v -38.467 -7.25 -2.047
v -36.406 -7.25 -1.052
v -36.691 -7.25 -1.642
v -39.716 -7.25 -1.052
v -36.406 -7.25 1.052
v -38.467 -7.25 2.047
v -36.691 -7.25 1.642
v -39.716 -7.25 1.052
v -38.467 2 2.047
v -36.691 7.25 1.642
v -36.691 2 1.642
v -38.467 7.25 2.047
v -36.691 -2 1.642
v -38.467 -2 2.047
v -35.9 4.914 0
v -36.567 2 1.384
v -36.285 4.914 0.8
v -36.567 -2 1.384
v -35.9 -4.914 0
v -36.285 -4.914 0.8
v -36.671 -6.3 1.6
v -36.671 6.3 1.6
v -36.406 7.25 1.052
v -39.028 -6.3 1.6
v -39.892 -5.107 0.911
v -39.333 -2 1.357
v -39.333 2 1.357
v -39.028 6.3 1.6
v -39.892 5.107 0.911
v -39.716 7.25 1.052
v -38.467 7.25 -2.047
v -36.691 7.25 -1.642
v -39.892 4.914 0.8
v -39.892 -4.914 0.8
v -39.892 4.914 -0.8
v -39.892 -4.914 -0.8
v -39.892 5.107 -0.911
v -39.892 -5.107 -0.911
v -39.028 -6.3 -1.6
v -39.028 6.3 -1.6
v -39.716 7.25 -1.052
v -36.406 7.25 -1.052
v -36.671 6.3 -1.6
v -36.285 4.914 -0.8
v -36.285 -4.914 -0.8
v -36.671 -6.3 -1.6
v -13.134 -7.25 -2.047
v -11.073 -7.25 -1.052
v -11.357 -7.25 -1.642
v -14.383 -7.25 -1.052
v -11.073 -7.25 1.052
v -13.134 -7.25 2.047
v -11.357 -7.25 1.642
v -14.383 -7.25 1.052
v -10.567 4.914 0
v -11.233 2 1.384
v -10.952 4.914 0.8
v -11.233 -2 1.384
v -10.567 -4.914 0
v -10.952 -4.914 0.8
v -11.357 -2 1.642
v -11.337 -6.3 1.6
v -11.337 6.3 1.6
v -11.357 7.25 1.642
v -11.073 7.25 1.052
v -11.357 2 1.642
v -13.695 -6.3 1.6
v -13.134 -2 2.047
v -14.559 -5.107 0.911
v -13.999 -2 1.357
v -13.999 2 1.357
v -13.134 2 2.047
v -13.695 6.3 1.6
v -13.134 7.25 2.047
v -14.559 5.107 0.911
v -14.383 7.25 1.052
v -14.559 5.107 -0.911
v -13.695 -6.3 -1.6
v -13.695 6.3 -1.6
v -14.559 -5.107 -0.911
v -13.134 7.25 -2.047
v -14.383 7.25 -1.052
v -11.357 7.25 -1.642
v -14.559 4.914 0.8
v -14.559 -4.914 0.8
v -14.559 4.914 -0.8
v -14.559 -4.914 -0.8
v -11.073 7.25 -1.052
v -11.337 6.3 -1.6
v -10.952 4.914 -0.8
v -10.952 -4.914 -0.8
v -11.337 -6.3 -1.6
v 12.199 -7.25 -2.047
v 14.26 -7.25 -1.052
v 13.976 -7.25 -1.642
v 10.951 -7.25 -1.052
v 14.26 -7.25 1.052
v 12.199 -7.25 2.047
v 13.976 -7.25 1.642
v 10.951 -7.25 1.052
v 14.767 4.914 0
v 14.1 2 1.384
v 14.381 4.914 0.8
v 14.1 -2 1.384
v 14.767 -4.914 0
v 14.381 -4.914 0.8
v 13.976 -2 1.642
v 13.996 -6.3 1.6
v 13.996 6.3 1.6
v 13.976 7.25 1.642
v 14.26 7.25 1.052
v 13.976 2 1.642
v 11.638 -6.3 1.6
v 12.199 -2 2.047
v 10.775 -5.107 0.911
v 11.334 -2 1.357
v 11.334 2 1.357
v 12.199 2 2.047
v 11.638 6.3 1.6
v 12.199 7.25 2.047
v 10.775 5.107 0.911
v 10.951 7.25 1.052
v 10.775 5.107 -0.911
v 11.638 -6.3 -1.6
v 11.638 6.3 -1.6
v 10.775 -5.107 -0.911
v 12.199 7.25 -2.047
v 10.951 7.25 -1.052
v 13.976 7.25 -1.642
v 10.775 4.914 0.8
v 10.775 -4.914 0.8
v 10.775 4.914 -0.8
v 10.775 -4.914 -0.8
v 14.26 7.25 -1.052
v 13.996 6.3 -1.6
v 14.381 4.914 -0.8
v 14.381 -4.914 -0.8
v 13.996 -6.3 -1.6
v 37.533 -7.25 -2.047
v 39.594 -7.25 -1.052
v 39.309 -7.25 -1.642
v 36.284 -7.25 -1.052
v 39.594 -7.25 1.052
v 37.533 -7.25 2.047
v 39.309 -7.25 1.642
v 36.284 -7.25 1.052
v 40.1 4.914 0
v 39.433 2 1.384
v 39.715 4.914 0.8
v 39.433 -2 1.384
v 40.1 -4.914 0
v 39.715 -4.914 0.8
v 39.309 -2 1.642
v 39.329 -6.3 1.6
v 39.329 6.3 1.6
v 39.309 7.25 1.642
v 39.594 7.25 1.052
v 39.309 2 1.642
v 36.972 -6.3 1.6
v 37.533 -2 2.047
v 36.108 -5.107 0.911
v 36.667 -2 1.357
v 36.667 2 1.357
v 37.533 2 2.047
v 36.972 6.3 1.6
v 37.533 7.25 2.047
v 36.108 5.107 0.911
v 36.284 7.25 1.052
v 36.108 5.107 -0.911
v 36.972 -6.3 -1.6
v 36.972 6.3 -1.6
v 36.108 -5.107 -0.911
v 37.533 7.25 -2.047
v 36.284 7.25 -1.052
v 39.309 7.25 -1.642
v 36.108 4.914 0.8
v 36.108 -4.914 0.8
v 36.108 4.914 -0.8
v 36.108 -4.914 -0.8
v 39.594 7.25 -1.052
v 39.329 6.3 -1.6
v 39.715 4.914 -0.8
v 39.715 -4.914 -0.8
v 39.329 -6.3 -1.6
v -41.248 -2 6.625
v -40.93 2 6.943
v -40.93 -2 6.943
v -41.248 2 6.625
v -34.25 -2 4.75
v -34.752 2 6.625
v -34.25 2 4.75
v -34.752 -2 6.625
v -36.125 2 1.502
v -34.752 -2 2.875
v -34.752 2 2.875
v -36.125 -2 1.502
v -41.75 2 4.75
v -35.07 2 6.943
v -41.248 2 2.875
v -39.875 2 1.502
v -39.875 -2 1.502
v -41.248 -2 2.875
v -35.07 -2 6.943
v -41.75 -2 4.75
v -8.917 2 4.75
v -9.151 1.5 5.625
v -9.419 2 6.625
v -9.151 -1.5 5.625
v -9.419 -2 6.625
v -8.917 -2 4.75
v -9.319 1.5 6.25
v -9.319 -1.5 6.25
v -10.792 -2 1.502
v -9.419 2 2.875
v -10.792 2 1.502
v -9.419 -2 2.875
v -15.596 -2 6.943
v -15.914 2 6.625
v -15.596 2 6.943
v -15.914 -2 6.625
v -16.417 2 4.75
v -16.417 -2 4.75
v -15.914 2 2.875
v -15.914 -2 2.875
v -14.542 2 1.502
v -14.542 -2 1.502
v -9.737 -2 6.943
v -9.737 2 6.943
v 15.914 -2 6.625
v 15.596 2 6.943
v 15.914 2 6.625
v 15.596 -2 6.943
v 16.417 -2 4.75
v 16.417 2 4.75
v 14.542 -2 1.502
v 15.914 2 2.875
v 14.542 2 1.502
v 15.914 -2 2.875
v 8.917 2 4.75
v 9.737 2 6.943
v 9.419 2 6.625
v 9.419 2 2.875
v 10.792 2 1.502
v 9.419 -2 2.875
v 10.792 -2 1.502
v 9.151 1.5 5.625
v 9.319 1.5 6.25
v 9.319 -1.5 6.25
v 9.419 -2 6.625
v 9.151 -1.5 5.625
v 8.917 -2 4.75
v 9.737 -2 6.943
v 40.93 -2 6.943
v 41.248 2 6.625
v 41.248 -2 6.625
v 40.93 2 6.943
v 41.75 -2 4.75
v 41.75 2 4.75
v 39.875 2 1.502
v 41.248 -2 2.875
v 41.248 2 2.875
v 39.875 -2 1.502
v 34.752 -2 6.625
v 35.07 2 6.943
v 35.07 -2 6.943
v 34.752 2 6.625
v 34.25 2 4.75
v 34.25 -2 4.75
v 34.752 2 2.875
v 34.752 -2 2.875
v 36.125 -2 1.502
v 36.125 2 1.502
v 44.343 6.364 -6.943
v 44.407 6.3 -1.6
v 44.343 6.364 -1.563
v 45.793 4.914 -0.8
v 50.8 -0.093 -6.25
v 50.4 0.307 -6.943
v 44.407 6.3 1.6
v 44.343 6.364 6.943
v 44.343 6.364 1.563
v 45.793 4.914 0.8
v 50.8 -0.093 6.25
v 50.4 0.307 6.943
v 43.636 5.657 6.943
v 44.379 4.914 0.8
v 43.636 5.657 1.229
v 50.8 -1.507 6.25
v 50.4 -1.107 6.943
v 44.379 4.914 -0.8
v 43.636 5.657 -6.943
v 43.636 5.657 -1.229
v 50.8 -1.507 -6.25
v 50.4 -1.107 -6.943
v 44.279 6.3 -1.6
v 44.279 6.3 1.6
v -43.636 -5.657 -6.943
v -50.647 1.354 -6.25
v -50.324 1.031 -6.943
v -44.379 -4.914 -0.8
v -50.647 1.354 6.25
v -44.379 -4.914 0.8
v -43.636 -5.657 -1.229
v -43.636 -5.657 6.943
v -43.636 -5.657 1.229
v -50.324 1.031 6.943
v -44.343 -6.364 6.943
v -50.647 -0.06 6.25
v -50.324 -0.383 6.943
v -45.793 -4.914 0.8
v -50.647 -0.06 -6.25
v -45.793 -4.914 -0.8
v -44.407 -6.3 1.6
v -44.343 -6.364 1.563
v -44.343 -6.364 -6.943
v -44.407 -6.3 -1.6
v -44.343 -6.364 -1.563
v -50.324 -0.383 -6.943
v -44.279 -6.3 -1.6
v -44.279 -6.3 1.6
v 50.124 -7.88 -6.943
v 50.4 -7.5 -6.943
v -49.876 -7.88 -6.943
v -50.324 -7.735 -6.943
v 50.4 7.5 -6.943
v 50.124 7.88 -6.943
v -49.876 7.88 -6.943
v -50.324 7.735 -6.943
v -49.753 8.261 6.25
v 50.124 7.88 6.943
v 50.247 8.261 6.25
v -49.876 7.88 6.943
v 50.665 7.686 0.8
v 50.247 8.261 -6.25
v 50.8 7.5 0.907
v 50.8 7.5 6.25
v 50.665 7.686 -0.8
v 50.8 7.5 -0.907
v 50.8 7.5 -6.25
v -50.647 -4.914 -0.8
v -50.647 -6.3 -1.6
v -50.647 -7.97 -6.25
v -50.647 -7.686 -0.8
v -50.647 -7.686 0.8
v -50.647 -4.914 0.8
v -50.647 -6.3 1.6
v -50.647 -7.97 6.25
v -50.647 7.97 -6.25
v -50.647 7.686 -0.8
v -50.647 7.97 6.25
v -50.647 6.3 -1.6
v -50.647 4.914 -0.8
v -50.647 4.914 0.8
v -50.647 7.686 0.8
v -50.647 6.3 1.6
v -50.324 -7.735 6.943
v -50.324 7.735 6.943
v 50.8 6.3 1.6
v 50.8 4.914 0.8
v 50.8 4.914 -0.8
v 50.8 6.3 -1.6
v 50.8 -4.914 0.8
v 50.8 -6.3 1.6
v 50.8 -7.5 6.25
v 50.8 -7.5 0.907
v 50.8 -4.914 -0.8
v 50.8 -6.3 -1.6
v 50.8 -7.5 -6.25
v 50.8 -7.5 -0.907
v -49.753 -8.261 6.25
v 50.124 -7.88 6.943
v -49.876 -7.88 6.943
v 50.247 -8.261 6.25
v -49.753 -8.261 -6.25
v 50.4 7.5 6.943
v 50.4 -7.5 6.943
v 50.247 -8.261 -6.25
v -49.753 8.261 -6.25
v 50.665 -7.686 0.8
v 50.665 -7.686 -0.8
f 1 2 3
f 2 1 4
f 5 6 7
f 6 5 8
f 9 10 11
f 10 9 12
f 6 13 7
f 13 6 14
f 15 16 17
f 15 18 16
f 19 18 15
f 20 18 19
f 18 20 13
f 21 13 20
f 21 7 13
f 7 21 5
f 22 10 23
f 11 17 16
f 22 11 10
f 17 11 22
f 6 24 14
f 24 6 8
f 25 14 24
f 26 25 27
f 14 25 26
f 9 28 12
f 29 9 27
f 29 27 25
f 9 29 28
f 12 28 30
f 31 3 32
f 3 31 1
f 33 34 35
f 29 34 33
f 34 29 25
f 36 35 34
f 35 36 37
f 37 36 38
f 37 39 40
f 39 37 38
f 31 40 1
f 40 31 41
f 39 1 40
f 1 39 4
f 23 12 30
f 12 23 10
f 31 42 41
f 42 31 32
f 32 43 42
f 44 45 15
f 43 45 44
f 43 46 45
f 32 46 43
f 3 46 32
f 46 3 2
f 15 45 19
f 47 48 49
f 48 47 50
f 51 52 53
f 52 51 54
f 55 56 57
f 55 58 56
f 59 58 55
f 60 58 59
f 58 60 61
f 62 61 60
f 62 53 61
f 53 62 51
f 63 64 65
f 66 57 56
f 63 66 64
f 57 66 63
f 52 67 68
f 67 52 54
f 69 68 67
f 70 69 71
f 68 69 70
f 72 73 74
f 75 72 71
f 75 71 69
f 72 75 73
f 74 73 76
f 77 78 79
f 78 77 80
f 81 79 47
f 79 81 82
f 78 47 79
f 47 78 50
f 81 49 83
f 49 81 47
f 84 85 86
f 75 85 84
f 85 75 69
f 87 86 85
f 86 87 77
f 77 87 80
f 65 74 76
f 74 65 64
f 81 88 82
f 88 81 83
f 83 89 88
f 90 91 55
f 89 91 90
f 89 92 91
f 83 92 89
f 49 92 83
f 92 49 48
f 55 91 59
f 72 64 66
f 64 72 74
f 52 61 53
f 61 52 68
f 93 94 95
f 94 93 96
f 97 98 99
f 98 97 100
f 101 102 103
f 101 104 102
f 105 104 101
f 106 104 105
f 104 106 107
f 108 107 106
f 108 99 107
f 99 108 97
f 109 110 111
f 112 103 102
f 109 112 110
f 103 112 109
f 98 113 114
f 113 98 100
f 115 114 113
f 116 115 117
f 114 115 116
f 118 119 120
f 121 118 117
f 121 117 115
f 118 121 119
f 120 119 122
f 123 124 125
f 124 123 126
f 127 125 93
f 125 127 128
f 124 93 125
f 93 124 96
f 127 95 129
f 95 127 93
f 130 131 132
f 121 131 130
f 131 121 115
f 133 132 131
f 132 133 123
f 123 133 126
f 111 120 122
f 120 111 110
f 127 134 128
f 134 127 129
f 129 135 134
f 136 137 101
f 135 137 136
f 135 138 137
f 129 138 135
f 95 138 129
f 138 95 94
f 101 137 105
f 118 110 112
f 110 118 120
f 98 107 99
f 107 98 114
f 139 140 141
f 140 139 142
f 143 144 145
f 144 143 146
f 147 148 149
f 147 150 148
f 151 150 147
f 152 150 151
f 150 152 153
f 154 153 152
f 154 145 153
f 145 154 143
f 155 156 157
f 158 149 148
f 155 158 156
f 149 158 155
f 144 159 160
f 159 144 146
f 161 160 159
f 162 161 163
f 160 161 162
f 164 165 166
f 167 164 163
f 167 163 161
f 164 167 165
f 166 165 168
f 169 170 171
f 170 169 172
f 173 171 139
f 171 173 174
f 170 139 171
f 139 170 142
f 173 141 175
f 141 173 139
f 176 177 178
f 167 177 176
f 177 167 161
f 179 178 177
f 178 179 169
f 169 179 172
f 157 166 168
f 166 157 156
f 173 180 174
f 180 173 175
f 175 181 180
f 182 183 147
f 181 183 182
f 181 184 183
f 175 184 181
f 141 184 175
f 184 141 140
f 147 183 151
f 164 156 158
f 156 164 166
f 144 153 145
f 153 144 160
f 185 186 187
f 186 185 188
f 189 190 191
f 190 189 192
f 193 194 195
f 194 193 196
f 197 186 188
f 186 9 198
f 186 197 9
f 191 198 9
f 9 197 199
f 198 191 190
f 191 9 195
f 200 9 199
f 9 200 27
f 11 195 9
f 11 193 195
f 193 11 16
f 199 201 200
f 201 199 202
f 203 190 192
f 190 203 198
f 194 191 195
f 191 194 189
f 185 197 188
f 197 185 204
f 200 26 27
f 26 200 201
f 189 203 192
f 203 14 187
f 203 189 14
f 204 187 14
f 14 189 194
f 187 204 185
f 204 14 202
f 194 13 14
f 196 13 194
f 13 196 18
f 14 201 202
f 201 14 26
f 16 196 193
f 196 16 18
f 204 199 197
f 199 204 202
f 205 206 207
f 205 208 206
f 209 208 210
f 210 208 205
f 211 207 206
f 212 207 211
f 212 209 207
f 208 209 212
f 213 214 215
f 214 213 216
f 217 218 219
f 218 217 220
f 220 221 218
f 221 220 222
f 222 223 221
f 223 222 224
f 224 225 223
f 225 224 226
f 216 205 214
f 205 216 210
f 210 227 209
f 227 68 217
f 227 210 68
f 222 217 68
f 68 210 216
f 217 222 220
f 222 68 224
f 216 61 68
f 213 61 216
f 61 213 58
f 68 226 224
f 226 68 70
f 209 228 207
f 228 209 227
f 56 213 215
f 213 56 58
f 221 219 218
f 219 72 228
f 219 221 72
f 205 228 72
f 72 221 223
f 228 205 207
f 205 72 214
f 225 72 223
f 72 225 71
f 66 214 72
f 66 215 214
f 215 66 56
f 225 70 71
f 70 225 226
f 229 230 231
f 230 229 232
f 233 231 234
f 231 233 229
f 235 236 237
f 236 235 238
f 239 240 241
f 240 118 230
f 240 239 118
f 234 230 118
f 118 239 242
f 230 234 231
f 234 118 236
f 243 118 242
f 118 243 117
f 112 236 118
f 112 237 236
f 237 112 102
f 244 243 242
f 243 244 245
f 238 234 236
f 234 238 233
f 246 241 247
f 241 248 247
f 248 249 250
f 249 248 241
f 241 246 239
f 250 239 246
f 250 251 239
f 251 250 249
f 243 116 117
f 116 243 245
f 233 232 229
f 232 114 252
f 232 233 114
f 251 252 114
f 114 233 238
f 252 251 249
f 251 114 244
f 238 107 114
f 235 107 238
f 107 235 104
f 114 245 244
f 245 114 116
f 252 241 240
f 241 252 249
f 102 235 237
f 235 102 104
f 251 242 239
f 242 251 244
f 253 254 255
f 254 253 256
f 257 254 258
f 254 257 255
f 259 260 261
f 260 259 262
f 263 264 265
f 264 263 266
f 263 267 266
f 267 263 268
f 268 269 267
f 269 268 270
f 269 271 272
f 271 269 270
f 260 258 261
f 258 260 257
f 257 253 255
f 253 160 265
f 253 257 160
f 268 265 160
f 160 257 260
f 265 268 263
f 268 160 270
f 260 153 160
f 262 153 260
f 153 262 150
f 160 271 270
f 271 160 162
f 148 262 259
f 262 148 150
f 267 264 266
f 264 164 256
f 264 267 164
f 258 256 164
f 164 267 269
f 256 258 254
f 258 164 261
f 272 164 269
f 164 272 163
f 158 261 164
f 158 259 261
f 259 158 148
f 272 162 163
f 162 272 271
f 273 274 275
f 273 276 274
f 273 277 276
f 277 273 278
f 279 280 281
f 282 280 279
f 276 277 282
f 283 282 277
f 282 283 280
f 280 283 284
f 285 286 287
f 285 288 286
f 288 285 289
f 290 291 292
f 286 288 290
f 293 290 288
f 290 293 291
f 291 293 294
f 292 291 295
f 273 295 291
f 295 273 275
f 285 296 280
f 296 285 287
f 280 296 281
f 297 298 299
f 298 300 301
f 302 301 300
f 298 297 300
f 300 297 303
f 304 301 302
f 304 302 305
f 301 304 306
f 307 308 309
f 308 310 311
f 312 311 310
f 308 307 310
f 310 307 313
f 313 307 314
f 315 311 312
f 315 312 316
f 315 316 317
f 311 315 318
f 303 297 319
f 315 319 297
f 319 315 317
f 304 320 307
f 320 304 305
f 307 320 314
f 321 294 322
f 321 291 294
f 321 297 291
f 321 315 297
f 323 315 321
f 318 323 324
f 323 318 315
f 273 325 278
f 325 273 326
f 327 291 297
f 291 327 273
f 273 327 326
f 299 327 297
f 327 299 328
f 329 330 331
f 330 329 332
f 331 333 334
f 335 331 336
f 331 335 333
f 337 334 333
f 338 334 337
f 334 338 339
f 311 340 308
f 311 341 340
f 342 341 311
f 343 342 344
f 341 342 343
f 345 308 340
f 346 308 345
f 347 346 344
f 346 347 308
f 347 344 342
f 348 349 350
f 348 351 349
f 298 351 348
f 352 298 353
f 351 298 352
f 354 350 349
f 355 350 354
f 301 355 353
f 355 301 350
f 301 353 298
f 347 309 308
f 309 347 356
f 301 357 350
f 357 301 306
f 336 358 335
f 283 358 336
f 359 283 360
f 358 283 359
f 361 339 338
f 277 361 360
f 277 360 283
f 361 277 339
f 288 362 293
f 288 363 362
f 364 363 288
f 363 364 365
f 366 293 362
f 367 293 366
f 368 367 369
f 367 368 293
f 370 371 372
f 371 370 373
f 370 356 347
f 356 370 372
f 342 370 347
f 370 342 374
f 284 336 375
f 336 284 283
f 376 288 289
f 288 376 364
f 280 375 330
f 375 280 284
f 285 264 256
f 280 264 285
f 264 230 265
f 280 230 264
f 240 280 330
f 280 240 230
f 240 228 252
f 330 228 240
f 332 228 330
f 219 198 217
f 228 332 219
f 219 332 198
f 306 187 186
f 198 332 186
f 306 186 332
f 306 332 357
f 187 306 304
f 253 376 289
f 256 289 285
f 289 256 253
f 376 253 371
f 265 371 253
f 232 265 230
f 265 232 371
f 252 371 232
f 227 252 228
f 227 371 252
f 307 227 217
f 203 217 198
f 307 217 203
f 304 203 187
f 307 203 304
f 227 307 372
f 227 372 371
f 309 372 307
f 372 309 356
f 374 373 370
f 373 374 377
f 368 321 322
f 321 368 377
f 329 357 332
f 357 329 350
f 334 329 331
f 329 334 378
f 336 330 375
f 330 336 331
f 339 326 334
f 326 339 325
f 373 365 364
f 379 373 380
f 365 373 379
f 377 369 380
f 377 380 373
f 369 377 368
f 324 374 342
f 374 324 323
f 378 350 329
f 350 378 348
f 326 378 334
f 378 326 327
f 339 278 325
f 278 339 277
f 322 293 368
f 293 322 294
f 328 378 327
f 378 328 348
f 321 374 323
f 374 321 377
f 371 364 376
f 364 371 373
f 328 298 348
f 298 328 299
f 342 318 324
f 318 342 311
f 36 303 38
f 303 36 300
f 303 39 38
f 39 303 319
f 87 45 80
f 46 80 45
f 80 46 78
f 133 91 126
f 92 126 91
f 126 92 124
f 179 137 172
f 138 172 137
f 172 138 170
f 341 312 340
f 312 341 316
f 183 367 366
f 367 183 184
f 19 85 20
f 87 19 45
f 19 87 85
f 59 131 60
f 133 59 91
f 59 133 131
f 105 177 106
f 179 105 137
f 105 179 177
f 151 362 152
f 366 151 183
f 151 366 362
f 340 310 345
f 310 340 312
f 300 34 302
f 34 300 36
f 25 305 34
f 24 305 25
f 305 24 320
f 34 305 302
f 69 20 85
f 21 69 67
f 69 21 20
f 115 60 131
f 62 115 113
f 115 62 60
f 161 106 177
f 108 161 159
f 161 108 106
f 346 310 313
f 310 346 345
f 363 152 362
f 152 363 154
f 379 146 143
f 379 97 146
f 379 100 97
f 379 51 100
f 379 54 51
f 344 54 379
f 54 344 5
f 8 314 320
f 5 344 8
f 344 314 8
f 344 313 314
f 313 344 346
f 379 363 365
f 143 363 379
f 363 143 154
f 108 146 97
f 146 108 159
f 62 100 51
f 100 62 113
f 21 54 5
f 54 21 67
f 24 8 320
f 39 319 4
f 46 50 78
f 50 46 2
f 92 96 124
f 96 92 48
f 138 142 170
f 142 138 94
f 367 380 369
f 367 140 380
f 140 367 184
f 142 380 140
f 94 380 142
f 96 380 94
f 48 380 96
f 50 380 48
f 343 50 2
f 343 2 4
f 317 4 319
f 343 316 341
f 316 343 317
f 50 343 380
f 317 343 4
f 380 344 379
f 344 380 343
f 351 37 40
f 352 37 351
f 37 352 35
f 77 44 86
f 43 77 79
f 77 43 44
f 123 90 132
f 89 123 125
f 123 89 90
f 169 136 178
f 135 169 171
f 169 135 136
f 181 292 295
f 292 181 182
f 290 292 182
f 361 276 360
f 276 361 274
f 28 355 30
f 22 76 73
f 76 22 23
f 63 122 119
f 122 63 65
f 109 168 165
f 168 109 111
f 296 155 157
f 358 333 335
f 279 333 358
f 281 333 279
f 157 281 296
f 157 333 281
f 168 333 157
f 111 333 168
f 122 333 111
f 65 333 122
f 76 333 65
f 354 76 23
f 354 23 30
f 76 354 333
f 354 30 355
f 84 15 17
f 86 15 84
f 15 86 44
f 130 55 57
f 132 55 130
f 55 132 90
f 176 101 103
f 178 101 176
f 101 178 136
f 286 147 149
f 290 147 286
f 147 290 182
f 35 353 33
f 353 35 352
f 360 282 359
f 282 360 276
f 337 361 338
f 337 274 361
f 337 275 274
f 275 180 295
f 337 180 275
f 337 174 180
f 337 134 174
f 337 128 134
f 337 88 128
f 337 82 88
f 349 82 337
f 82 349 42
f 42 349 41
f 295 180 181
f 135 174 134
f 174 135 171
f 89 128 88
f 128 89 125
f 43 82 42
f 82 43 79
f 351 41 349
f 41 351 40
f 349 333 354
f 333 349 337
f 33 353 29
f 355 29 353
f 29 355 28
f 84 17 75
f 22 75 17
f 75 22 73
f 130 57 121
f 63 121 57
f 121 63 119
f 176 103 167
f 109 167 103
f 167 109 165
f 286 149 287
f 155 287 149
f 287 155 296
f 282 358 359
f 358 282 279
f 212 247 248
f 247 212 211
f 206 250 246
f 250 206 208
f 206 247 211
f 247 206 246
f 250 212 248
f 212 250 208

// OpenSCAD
// Parameters
rail_length = 100.0; //[50.0:200.0:1.0]
rail_width = 15.0; //[7.5:30.0:0.5]
rail_height = 12.5; //[6.25:25.0:0.5]
hole_count = 4; //[2:10:1]
end_margin = 12.0; //[6.0:24.0:0.5]
mount_hole_d = 4.2; //[2.0:8.0:0.1]
counterbore_d = 7.5; //[4.0:14.0:0.1]
counterbore_depth = 3.0; //[1.0:6.0:0.1]
end_chamfer = 1.0; //[0.5:3.0:0.1]
edge_fillet_r = 0.8; //[0.2:2.0:0.1]
raceway_groove_r = 1.6; //[0.8:3.0:0.1]
raceway_groove_depth = 1.2; //[0.5:3.0:0.1]
raceway_groove_z = 0.0; //[-3.0:3.0:0.1]
overlap = 1.0; //[0.5:2.0:0.1]

// Base Shapes
module rail_body() {
  cube([rail_length, rail_width, rail_height], center=true);
}

module edge_fillets_sphere() {
  sphere(r=edge_fillet_r, center=true);
}

module mount_hole_cyl_base() {
  rotate([90, 0, 0])
    cylinder(h=rail_height + 2*overlap, r=mount_hole_d/2, center=true);
}

module counterbore_cyl_base() {
  rotate([90, 0, 0])
    cylinder(h=counterbore_depth + overlap, r=counterbore_d/2, center=true);
}

module raceway_groove_left() {
  translate([0, -(rail_width/2 - raceway_groove_depth), raceway_groove_z])
    rotate([0, 90, 0])
      cylinder(h=rail_length + 2*overlap, r=raceway_groove_r, center=true);
}

module raceway_groove_right() {
  translate([0, (rail_width/2 - raceway_groove_depth), raceway_groove_z])
    rotate([0, 90, 0])
      cylinder(h=rail_length + 2*overlap, r=raceway_groove_r, center=true);
}

module end_chamfer_wedge_pos() {
  translate([rail_length/2 - end_chamfer/2 + overlap/2, 0, 0])
    rotate([0, 0, 45])
      cube([end_chamfer, rail_width + 2*overlap, rail_height + 2*overlap], center=true);
}

module end_chamfer_wedge_neg() {
  translate([-(rail_length/2 - end_chamfer/2 + overlap/2), 0, 0])
    rotate([0, 0, 45])
      cube([end_chamfer, rail_width + 2*overlap, rail_height + 2*overlap], center=true);
}

module engraved_markings() {
  translate([0, 0, rail_height/2 - (rail_height/40)])
    cube([rail_length/5, rail_width/5, rail_height/20], center=true);
}

// Operations
module edge_fillets() {
  minkowski() {
    rail_body();
    edge_fillets_sphere();
  }
}

module mounting_holes() {
  union() {
    for (i = [0:hole_count-1]) {
      translate([-(rail_length/2 - end_margin) + i*(rail_length - 2*end_margin)/(hole_count-1), 0, 0])
        mount_hole_cyl_base();
    }
  }
}

module counterbores() {
  union() {
    for (i = [0:hole_count-1]) {
      translate([-(rail_length/2 - end_margin) + i*(rail_length - 2*end_margin)/(hole_count-1), 0, rail_height/2 - (counterbore_depth + overlap)/2 + overlap/2])
        counterbore_cyl_base();
    }
  }
}

module end_chamfers() {
  union() {
    end_chamfer_wedge_pos();
    end_chamfer_wedge_neg();
  }
}

// Final Rail
difference() {
  edge_fillets();
  mounting_holes();
  counterbores();
  raceway_groove_left();
  raceway_groove_right();
  end_chamfers();
  engraved_markings();
}
